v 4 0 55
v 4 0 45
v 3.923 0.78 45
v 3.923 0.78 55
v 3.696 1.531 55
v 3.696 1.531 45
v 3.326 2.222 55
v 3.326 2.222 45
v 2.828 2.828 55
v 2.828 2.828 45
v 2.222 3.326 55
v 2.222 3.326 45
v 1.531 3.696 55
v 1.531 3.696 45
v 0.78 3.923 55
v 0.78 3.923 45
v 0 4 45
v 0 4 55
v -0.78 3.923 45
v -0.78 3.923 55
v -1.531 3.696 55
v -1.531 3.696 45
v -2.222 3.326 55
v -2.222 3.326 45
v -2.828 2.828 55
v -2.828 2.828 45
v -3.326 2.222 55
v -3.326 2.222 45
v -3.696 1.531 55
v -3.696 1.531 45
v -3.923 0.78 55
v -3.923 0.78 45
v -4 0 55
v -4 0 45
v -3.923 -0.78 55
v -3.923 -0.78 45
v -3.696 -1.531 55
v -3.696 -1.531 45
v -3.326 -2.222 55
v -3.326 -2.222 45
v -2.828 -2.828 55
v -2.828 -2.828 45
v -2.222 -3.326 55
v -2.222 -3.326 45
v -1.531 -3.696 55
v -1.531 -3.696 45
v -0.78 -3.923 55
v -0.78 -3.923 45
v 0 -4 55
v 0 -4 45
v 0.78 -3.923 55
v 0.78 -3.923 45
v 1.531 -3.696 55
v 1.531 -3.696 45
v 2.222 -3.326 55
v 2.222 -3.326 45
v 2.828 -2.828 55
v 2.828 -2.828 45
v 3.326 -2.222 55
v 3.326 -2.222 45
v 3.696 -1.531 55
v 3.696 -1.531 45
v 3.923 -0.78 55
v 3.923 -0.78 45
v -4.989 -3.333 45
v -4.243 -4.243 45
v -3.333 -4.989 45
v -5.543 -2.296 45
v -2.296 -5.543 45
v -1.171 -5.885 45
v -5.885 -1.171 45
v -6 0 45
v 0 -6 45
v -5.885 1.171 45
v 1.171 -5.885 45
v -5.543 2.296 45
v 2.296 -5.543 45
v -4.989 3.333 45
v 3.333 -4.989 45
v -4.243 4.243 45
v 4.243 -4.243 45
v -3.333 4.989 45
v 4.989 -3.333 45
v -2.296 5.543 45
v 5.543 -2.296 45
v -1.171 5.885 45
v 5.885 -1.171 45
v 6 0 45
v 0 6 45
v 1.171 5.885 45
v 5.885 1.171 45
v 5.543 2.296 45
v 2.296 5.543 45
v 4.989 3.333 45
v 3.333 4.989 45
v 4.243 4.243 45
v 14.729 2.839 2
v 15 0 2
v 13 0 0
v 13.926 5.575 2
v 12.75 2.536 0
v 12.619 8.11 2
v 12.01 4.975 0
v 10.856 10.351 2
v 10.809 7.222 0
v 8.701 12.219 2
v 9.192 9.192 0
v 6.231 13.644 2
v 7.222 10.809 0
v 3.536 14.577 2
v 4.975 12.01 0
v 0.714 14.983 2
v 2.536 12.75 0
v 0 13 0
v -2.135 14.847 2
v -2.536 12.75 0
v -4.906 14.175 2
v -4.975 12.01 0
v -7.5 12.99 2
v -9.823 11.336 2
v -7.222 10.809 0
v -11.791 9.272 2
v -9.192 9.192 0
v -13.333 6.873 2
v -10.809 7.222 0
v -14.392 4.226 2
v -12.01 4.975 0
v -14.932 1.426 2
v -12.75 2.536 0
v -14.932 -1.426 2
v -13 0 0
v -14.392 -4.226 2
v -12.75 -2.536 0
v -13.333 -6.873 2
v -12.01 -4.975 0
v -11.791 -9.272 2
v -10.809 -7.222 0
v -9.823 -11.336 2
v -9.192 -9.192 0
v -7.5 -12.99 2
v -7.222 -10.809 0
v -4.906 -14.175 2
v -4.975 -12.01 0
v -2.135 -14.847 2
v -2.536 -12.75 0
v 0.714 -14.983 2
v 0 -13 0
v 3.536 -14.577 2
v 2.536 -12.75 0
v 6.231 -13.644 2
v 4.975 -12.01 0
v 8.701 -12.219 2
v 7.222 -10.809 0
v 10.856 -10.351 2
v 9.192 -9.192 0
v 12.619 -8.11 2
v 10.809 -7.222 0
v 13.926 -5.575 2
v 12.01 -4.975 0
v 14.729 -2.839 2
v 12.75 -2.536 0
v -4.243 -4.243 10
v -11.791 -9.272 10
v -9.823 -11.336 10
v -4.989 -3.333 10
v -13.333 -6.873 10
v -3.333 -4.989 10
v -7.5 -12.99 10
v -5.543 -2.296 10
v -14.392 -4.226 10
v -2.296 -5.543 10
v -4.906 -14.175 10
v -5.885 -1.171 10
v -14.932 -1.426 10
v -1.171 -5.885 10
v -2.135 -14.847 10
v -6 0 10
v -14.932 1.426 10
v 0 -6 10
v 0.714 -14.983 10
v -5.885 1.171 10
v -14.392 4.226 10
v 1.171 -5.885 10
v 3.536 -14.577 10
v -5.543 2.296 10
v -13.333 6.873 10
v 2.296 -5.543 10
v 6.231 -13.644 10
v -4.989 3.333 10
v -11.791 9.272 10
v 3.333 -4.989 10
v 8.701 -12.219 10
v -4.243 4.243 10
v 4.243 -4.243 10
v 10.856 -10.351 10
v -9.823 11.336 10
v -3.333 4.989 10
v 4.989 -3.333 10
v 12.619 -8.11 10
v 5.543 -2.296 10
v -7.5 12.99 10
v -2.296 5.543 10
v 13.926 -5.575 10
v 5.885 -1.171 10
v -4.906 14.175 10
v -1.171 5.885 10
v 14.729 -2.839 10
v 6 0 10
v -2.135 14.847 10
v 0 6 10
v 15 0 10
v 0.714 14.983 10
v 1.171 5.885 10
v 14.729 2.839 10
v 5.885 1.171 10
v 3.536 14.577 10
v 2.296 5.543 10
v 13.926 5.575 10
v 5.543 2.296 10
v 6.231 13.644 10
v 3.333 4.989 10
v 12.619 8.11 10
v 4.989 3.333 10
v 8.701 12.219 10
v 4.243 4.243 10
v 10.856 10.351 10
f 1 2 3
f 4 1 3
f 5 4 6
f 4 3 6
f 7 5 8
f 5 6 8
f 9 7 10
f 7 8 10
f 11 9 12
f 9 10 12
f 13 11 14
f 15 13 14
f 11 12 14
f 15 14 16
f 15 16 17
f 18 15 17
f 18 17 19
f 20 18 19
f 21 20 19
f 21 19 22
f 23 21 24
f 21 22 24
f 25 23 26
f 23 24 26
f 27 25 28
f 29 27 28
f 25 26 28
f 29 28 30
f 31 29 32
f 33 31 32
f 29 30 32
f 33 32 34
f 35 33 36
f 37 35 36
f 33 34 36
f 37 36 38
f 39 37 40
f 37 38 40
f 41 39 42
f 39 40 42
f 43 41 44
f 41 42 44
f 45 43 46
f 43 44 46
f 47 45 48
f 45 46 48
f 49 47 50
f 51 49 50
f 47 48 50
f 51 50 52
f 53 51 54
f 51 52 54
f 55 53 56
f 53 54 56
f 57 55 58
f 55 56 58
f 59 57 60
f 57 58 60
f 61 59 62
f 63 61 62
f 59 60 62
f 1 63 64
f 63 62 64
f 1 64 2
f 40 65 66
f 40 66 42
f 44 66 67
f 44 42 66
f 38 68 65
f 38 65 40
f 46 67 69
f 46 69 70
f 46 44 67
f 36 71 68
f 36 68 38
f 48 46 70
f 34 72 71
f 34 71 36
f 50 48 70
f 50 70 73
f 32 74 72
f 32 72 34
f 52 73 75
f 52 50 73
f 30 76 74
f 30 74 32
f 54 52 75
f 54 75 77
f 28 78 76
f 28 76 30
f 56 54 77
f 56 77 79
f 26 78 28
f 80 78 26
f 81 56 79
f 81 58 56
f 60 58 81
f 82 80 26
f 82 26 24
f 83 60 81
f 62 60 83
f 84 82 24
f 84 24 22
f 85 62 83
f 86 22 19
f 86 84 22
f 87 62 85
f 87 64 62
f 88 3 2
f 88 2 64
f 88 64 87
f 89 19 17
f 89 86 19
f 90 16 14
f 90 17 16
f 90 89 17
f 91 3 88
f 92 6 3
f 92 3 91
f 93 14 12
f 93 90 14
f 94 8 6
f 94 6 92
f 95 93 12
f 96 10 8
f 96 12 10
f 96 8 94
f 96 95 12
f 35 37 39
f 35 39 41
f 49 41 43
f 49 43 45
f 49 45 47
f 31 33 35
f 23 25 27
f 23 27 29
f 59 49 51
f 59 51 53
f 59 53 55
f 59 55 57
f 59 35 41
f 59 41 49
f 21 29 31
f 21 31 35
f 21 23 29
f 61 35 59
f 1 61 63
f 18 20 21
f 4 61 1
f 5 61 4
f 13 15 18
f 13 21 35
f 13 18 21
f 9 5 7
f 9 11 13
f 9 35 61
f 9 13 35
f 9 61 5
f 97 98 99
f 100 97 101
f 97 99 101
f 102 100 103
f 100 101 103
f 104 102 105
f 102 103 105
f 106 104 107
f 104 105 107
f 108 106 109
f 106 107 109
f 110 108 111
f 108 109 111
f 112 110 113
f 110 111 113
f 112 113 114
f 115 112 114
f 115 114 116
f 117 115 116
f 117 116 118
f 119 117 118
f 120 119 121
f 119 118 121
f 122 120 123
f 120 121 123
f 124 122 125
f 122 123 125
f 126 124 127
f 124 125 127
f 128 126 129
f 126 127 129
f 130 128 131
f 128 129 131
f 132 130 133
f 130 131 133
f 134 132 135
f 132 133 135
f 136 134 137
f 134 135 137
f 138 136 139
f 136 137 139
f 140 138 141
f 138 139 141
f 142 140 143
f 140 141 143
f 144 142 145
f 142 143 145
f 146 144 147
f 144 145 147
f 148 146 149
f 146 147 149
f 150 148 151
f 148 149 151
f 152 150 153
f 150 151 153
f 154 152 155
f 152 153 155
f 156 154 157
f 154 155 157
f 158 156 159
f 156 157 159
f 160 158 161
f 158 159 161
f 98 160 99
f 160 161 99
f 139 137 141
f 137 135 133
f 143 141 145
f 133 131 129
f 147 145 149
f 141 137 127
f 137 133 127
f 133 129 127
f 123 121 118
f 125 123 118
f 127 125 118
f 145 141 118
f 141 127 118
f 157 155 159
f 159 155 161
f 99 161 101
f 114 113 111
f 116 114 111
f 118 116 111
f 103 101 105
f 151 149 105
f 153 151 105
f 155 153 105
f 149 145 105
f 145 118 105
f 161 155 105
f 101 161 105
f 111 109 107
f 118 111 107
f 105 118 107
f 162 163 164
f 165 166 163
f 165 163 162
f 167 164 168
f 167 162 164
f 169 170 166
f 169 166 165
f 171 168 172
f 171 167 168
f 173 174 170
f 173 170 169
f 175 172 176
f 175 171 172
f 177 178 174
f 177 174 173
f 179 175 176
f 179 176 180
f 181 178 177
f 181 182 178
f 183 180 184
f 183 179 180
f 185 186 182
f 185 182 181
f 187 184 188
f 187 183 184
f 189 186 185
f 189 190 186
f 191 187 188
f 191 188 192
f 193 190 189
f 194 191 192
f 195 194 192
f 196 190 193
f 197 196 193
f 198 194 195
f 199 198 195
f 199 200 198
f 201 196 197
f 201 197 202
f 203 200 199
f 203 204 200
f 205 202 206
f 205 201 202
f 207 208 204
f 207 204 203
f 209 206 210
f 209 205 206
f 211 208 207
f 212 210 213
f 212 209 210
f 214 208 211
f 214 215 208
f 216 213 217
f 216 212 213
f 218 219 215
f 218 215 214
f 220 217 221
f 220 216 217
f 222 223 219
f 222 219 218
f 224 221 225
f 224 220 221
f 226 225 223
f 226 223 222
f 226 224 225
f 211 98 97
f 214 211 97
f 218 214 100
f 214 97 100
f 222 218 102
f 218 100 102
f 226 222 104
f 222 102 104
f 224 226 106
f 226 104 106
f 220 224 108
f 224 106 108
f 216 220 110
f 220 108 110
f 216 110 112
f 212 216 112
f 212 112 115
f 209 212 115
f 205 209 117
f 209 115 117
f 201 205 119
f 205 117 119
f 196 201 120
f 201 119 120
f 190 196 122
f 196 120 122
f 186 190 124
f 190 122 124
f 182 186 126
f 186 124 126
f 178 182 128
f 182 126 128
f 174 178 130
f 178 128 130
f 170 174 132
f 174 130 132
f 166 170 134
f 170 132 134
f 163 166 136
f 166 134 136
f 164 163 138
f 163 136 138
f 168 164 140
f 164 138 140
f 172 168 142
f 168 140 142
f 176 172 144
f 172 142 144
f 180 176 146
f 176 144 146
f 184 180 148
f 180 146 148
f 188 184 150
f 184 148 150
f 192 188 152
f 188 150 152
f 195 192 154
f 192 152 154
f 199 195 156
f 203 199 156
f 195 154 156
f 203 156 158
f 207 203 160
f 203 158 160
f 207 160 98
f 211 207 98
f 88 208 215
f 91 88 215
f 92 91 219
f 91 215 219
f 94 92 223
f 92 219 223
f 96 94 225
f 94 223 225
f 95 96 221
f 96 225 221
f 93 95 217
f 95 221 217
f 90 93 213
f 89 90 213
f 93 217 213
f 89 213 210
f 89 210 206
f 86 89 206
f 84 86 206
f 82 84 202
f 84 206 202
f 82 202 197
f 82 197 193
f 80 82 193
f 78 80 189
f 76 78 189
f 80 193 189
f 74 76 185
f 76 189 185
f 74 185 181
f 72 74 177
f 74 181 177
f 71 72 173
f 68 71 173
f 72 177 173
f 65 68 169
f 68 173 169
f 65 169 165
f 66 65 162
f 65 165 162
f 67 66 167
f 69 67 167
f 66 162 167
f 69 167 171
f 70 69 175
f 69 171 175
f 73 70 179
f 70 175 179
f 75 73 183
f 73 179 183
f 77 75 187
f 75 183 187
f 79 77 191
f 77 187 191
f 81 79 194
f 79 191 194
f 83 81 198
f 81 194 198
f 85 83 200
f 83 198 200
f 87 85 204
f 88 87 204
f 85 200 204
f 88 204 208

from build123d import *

# Parameters (mm, degrees)
ESBO_O1_R                = 15
RESSALTO_EXTRUS_O1_DEPTH = 10
ESBO_O2_R                = 6
RESSALTO_EXTRUS_O2_DEPTH = 35
ESBO_O3_R                = 4
RESSALTO_EXTRUS_O3_DEPTH = 10
CHANFRO1_SIZE            = 2


with BuildPart() as part:
    # Esboço1 → Ressalto-extrusão1 (new body)
    with BuildSketch(Plane.XY):
        Circle(ESBO_O1_R)
    extrude(amount=RESSALTO_EXTRUS_O1_DEPTH)

    # Esboço2 → Ressalto-extrusão2 (add)
    with BuildSketch(Plane.XY.offset(10)):
        Circle(ESBO_O2_R)
    extrude(amount=RESSALTO_EXTRUS_O2_DEPTH)

    # Esboço3 → Ressalto-extrusão3 (add)
    with BuildSketch(Plane.XY.offset(45)):
        Circle(ESBO_O3_R)
    extrude(amount=RESSALTO_EXTRUS_O3_DEPTH)

    # Chanfro1
    chanfro1_edges = [part.edges().sort_by_distance(p)[0] for p in [
        (-15, 0, 0),
    ]]
    chamfer(chanfro1_edges, length=CHANFRO1_SIZE)


solid = part.part
